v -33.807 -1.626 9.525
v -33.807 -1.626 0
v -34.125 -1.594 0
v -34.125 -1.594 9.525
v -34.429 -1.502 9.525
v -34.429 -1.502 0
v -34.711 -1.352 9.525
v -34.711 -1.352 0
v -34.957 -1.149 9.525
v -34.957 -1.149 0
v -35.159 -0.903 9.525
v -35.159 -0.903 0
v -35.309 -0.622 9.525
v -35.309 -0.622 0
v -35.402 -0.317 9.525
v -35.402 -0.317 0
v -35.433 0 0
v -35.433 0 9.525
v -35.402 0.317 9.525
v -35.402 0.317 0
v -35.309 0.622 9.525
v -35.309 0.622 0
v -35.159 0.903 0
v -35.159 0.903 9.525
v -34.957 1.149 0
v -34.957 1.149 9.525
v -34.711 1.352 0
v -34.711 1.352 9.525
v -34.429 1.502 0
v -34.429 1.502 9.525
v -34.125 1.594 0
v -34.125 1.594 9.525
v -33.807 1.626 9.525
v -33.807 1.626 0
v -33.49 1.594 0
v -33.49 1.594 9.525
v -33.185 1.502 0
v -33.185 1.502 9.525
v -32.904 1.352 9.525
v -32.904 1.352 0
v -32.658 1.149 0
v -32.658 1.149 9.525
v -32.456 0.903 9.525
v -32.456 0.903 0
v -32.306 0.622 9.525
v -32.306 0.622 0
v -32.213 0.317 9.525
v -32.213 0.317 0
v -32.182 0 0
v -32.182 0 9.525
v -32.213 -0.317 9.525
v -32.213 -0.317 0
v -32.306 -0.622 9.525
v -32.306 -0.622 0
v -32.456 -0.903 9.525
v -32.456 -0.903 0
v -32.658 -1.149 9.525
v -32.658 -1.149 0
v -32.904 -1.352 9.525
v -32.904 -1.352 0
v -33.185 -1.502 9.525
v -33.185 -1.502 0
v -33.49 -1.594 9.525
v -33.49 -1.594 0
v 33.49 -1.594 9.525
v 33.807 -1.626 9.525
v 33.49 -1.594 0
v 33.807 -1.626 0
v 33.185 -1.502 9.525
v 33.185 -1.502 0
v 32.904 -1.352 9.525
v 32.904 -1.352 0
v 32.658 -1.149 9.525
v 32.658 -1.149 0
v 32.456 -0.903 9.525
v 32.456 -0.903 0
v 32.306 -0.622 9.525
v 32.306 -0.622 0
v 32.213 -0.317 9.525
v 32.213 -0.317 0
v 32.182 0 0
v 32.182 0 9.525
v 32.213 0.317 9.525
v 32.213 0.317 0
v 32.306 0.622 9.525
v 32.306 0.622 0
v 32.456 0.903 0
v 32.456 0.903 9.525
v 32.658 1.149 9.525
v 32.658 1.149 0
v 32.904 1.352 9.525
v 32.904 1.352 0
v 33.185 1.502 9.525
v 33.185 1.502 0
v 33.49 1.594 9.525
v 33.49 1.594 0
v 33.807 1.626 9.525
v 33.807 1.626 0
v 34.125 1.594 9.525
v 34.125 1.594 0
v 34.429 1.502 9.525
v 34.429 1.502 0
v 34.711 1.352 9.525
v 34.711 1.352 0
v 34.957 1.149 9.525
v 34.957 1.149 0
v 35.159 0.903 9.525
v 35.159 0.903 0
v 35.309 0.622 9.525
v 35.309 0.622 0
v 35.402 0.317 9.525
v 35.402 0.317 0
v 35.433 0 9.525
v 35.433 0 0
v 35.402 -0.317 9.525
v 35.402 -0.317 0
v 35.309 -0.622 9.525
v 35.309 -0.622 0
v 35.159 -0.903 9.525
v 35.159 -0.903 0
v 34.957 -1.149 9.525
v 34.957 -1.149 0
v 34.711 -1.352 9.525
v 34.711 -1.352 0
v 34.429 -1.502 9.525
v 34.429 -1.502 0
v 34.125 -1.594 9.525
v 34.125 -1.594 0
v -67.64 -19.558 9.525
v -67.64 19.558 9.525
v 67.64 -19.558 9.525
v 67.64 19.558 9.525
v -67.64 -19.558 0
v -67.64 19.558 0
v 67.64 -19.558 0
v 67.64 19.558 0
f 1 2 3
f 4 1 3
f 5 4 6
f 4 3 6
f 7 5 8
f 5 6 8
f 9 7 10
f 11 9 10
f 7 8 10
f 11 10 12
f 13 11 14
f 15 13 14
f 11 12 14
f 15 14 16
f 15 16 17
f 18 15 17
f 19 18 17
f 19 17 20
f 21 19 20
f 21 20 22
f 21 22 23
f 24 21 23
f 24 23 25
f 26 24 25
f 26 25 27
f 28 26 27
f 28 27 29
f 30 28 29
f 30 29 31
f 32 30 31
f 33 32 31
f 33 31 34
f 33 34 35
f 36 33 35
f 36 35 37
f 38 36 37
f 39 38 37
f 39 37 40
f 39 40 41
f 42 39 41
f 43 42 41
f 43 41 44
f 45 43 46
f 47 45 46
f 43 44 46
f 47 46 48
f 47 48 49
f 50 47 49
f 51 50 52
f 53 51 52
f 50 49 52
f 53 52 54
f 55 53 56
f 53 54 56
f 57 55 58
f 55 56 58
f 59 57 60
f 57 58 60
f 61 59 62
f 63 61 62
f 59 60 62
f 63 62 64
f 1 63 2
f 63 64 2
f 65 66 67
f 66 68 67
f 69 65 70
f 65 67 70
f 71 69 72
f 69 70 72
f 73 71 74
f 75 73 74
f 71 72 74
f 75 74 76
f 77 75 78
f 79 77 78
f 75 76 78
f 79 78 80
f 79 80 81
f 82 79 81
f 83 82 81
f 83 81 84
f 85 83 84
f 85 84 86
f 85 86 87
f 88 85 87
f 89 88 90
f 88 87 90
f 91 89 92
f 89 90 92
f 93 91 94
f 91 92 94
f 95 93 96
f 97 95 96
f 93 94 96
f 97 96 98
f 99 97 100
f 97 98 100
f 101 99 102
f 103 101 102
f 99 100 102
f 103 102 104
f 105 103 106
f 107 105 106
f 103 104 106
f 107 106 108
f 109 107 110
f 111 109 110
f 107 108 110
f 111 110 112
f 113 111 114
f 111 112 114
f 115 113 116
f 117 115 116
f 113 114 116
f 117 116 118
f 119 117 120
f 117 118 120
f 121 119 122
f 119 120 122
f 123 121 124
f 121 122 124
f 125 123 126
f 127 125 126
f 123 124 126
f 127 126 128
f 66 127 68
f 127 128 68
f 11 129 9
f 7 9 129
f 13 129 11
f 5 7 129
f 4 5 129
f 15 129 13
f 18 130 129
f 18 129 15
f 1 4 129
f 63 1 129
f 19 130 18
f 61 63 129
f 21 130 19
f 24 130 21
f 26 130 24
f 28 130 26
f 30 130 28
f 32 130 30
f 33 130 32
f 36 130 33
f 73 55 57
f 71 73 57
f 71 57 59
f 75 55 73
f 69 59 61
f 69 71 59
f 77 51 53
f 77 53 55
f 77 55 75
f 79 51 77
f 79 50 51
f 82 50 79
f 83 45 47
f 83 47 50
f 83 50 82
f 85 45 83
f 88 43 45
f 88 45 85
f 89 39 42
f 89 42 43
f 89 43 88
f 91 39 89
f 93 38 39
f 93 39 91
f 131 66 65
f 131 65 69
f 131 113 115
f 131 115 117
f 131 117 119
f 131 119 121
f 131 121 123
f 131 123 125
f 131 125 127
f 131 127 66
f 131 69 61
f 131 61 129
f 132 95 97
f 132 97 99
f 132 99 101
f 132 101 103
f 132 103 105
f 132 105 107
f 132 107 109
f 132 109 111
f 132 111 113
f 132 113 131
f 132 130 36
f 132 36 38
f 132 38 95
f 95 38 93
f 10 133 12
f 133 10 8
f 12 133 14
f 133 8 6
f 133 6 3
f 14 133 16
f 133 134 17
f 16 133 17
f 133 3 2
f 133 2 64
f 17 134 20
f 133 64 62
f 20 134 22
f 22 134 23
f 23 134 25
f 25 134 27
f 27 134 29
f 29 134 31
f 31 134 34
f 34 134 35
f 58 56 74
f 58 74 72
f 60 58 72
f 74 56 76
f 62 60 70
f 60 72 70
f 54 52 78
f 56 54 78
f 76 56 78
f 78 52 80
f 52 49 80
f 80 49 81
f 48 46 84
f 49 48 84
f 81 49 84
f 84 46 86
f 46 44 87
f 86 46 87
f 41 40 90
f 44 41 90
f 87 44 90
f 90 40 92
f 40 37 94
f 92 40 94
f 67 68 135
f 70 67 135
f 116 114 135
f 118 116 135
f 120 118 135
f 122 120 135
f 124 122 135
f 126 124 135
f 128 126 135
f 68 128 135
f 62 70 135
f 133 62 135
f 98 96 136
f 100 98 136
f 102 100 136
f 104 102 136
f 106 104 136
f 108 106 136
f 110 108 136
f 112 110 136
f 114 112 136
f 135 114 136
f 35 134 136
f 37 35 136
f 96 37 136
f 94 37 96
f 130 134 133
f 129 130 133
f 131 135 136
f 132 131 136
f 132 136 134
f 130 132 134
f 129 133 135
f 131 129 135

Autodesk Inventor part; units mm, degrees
ref_plane "YZ Plane" through (0, 0, 0) normal (1, 0, 0) x (0, 1, 0)
ref_plane "XZ Plane" through (0, 0, 0) normal (0, 1, 0) x (-1, 0, 0)
ref_plane "XY Plane" through (0, 0, 0) normal (0, 0, 1) x (1, 0, 0)
sketch "Sketch1" plane through (0, 0, 0) normal (0, 0, 1) x (1, 0, 0)
  line L0 (-67.6402, -19.558) -> (67.6402, -19.558)
  line L1 (67.6402, -19.558) -> (67.6402, 19.558)
  line L2 (67.6402, 19.558) -> (-67.6402, 19.558)
  line L3 (-67.6402, 19.558) -> (-67.6402, -19.558)
  line L4 (-67.6402, -19.558) -> (67.6402, 19.558) construction
  line L5 (67.6402, -19.558) -> (-67.6402, 19.558) construction
  point P0 (0, 0)
  dimension "d0" = 135.2804
  dimension "d1" = 39.116
extrude "Extrusion1" add sketch "Sketch1" along normal blind 9.525
sketch "Sketch2" plane through (0, 0, 9.525) normal (0, 0, 1) x (1, 0, 0)
  line L0 (-67.5894, 0) -> (67.7772, 0)
  line L1 (-67.6402, 19.558) -> (-67.6402, -19.558) projected
  line L2 (67.6402, -19.558) -> (67.6402, 19.558) projected
  line L3 (-67.6402, -19.558) -> (67.6402, -19.558) projected
  point P0 (0, 0)
  point P1 (-33.8074, 0)
  point P2 (33.8074, 0)
  dimension "d4" = 33.8328
  dimension "d5" = 33.8328
  dimension "d13" = 19.558
hole "Hole1" at (-33.8074, 0, 9.525) at (33.8074, 0, 9.525) direction (0, 0, -1) diameter 3.2512 end through all
properties part number "nmt_metalplate"
